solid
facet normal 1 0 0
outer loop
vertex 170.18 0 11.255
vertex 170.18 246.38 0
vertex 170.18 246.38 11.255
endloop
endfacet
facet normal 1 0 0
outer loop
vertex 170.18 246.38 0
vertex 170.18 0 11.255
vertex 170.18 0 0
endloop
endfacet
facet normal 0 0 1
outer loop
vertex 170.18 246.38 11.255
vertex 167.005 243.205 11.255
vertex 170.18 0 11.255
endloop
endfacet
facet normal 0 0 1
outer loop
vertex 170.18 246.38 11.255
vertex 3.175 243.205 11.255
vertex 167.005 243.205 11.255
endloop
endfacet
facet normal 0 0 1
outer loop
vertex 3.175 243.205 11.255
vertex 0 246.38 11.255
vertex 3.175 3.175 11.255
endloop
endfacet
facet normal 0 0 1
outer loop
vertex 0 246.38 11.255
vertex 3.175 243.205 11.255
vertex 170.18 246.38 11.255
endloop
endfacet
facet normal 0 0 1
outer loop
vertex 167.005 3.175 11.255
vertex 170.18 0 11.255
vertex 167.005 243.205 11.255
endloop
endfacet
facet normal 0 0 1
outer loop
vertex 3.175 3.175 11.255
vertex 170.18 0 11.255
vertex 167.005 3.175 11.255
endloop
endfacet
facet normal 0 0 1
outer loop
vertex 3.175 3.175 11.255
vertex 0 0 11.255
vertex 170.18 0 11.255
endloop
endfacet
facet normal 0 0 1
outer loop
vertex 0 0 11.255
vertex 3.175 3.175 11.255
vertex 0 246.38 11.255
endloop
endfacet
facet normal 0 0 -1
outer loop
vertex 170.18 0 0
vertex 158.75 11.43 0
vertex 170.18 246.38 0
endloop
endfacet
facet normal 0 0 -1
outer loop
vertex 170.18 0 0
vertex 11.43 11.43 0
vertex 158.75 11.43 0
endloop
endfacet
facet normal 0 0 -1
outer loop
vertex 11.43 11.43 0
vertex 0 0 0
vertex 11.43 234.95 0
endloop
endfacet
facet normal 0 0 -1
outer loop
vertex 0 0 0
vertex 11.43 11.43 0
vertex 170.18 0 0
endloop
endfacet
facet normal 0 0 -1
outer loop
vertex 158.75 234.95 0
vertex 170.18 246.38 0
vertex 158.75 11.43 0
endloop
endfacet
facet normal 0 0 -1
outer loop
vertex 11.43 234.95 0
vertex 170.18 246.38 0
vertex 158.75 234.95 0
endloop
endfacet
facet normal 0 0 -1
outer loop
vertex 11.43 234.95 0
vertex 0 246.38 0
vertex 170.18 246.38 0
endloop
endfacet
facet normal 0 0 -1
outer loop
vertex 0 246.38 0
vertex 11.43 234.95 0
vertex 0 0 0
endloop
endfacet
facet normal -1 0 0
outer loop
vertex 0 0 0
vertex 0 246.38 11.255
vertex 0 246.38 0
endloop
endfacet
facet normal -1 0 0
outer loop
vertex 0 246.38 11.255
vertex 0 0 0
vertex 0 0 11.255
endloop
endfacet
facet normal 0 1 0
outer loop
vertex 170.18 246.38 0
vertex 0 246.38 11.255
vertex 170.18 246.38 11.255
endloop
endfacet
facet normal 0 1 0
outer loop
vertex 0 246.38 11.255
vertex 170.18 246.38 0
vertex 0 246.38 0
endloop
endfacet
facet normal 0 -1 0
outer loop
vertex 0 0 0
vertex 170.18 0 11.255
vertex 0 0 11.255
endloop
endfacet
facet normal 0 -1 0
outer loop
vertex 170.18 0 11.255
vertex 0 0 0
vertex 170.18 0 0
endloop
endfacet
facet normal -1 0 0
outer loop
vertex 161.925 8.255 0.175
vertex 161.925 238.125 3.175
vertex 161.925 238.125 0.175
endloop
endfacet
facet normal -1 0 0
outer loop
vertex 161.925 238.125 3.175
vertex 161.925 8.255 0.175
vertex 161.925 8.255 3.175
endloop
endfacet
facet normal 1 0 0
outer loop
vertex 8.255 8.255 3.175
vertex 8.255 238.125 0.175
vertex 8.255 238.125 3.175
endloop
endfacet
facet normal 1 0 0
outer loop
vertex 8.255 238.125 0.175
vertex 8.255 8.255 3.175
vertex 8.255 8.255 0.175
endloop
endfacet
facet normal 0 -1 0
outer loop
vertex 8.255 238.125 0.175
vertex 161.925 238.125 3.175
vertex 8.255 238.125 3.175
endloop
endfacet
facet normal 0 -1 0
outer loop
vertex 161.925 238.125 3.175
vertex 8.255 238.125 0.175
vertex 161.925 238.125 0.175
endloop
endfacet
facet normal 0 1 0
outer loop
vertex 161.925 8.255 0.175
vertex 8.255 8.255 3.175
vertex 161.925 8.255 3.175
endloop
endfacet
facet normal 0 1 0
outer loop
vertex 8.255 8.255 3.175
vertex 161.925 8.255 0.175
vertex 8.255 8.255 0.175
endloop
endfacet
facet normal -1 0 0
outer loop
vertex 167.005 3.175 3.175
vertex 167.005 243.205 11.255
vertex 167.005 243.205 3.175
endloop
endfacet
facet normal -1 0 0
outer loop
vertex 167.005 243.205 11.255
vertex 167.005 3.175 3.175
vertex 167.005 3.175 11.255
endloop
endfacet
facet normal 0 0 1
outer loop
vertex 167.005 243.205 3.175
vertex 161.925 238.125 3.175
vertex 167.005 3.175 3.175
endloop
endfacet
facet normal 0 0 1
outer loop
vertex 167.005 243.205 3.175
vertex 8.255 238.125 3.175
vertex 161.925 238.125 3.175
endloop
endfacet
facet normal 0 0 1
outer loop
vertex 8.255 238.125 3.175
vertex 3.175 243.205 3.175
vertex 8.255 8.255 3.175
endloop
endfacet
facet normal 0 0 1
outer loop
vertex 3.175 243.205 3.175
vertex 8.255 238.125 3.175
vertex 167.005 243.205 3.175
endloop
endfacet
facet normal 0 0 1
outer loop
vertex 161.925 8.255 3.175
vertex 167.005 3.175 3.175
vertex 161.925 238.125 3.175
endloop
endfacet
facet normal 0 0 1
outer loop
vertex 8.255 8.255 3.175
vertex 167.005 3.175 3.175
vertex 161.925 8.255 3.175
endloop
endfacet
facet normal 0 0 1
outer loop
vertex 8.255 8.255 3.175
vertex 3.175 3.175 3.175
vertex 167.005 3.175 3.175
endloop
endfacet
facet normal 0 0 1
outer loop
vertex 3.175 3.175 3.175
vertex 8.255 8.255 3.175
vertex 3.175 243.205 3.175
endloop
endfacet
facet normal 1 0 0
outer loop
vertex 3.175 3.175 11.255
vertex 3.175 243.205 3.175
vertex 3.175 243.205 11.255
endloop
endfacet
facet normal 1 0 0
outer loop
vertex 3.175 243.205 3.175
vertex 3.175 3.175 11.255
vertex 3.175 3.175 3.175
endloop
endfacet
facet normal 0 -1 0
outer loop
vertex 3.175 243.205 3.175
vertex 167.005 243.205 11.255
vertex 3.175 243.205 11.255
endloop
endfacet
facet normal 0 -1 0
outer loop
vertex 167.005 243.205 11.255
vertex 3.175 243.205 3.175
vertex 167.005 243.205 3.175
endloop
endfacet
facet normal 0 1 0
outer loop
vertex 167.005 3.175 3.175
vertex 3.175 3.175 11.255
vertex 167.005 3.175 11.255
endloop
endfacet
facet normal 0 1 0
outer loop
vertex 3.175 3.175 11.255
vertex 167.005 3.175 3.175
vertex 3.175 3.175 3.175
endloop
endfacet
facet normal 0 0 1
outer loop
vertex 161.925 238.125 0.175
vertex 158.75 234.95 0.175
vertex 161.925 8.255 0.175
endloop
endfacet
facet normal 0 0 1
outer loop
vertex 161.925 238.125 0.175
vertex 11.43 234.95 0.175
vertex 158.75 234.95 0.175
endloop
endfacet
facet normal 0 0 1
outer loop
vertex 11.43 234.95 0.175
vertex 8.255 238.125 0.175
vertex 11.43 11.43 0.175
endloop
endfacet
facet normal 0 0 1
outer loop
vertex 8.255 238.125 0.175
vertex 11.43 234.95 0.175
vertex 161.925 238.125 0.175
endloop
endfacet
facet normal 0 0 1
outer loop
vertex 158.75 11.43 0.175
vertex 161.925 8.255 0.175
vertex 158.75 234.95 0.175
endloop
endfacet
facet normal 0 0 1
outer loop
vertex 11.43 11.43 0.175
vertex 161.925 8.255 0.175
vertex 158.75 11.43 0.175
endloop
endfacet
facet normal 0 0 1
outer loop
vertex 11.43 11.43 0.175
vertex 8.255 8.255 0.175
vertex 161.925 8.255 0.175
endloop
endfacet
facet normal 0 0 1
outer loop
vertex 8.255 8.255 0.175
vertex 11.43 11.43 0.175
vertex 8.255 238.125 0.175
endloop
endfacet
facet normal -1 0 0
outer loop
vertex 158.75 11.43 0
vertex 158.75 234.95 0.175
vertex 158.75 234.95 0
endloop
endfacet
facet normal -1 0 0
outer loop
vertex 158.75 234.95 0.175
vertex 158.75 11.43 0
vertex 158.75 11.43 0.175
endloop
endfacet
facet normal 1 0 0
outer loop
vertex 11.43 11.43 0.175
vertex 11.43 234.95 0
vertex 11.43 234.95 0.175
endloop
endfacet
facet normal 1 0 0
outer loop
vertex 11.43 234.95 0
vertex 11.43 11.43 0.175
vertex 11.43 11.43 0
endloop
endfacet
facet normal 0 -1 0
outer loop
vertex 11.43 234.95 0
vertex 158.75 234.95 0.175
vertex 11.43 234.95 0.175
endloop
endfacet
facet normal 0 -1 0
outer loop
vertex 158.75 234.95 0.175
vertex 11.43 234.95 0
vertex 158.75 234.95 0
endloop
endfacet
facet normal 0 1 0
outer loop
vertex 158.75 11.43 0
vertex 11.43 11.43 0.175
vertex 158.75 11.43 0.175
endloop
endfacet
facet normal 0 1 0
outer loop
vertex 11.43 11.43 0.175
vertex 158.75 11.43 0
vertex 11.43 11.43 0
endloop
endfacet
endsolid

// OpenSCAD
inch = 25.4;

picture_x = 6.05 * inch;
picture_y = 9.05 * inch;
picture_z = 3;

wall_thickness = .2 * inch;

frame_x = picture_x + (wall_thickness * 2);
frame_y = picture_y + (wall_thickness * 2);
frame_z = picture_z + wall_thickness;

overhang = (1/8 * inch);

echo(overhang);


outside_x = frame_x + (overhang * 2);
outside_y = frame_y + (overhang * 2);
outside_z = frame_z + overhang;

picture_inset = overhang + wall_thickness;

difference() {
    cube([outside_x, outside_y, outside_z]);
    
    translate([picture_inset, picture_inset, 0]) {
        cube([picture_x, picture_y, picture_z + 10]);
    }
    
    translate([overhang, overhang, overhang]) {
        cube([frame_x, frame_y, frame_y + 10]);
    }
}

difference() {
    translate([picture_inset, picture_inset, 0]) {
        cube([picture_x, picture_y, (overhang - picture_z)]);
    }

    translate([picture_inset + overhang, picture_inset + overhang, 0]) {
        cube([picture_x - (overhang * 2), picture_y - (overhang * 2), 8]);
    }
}
